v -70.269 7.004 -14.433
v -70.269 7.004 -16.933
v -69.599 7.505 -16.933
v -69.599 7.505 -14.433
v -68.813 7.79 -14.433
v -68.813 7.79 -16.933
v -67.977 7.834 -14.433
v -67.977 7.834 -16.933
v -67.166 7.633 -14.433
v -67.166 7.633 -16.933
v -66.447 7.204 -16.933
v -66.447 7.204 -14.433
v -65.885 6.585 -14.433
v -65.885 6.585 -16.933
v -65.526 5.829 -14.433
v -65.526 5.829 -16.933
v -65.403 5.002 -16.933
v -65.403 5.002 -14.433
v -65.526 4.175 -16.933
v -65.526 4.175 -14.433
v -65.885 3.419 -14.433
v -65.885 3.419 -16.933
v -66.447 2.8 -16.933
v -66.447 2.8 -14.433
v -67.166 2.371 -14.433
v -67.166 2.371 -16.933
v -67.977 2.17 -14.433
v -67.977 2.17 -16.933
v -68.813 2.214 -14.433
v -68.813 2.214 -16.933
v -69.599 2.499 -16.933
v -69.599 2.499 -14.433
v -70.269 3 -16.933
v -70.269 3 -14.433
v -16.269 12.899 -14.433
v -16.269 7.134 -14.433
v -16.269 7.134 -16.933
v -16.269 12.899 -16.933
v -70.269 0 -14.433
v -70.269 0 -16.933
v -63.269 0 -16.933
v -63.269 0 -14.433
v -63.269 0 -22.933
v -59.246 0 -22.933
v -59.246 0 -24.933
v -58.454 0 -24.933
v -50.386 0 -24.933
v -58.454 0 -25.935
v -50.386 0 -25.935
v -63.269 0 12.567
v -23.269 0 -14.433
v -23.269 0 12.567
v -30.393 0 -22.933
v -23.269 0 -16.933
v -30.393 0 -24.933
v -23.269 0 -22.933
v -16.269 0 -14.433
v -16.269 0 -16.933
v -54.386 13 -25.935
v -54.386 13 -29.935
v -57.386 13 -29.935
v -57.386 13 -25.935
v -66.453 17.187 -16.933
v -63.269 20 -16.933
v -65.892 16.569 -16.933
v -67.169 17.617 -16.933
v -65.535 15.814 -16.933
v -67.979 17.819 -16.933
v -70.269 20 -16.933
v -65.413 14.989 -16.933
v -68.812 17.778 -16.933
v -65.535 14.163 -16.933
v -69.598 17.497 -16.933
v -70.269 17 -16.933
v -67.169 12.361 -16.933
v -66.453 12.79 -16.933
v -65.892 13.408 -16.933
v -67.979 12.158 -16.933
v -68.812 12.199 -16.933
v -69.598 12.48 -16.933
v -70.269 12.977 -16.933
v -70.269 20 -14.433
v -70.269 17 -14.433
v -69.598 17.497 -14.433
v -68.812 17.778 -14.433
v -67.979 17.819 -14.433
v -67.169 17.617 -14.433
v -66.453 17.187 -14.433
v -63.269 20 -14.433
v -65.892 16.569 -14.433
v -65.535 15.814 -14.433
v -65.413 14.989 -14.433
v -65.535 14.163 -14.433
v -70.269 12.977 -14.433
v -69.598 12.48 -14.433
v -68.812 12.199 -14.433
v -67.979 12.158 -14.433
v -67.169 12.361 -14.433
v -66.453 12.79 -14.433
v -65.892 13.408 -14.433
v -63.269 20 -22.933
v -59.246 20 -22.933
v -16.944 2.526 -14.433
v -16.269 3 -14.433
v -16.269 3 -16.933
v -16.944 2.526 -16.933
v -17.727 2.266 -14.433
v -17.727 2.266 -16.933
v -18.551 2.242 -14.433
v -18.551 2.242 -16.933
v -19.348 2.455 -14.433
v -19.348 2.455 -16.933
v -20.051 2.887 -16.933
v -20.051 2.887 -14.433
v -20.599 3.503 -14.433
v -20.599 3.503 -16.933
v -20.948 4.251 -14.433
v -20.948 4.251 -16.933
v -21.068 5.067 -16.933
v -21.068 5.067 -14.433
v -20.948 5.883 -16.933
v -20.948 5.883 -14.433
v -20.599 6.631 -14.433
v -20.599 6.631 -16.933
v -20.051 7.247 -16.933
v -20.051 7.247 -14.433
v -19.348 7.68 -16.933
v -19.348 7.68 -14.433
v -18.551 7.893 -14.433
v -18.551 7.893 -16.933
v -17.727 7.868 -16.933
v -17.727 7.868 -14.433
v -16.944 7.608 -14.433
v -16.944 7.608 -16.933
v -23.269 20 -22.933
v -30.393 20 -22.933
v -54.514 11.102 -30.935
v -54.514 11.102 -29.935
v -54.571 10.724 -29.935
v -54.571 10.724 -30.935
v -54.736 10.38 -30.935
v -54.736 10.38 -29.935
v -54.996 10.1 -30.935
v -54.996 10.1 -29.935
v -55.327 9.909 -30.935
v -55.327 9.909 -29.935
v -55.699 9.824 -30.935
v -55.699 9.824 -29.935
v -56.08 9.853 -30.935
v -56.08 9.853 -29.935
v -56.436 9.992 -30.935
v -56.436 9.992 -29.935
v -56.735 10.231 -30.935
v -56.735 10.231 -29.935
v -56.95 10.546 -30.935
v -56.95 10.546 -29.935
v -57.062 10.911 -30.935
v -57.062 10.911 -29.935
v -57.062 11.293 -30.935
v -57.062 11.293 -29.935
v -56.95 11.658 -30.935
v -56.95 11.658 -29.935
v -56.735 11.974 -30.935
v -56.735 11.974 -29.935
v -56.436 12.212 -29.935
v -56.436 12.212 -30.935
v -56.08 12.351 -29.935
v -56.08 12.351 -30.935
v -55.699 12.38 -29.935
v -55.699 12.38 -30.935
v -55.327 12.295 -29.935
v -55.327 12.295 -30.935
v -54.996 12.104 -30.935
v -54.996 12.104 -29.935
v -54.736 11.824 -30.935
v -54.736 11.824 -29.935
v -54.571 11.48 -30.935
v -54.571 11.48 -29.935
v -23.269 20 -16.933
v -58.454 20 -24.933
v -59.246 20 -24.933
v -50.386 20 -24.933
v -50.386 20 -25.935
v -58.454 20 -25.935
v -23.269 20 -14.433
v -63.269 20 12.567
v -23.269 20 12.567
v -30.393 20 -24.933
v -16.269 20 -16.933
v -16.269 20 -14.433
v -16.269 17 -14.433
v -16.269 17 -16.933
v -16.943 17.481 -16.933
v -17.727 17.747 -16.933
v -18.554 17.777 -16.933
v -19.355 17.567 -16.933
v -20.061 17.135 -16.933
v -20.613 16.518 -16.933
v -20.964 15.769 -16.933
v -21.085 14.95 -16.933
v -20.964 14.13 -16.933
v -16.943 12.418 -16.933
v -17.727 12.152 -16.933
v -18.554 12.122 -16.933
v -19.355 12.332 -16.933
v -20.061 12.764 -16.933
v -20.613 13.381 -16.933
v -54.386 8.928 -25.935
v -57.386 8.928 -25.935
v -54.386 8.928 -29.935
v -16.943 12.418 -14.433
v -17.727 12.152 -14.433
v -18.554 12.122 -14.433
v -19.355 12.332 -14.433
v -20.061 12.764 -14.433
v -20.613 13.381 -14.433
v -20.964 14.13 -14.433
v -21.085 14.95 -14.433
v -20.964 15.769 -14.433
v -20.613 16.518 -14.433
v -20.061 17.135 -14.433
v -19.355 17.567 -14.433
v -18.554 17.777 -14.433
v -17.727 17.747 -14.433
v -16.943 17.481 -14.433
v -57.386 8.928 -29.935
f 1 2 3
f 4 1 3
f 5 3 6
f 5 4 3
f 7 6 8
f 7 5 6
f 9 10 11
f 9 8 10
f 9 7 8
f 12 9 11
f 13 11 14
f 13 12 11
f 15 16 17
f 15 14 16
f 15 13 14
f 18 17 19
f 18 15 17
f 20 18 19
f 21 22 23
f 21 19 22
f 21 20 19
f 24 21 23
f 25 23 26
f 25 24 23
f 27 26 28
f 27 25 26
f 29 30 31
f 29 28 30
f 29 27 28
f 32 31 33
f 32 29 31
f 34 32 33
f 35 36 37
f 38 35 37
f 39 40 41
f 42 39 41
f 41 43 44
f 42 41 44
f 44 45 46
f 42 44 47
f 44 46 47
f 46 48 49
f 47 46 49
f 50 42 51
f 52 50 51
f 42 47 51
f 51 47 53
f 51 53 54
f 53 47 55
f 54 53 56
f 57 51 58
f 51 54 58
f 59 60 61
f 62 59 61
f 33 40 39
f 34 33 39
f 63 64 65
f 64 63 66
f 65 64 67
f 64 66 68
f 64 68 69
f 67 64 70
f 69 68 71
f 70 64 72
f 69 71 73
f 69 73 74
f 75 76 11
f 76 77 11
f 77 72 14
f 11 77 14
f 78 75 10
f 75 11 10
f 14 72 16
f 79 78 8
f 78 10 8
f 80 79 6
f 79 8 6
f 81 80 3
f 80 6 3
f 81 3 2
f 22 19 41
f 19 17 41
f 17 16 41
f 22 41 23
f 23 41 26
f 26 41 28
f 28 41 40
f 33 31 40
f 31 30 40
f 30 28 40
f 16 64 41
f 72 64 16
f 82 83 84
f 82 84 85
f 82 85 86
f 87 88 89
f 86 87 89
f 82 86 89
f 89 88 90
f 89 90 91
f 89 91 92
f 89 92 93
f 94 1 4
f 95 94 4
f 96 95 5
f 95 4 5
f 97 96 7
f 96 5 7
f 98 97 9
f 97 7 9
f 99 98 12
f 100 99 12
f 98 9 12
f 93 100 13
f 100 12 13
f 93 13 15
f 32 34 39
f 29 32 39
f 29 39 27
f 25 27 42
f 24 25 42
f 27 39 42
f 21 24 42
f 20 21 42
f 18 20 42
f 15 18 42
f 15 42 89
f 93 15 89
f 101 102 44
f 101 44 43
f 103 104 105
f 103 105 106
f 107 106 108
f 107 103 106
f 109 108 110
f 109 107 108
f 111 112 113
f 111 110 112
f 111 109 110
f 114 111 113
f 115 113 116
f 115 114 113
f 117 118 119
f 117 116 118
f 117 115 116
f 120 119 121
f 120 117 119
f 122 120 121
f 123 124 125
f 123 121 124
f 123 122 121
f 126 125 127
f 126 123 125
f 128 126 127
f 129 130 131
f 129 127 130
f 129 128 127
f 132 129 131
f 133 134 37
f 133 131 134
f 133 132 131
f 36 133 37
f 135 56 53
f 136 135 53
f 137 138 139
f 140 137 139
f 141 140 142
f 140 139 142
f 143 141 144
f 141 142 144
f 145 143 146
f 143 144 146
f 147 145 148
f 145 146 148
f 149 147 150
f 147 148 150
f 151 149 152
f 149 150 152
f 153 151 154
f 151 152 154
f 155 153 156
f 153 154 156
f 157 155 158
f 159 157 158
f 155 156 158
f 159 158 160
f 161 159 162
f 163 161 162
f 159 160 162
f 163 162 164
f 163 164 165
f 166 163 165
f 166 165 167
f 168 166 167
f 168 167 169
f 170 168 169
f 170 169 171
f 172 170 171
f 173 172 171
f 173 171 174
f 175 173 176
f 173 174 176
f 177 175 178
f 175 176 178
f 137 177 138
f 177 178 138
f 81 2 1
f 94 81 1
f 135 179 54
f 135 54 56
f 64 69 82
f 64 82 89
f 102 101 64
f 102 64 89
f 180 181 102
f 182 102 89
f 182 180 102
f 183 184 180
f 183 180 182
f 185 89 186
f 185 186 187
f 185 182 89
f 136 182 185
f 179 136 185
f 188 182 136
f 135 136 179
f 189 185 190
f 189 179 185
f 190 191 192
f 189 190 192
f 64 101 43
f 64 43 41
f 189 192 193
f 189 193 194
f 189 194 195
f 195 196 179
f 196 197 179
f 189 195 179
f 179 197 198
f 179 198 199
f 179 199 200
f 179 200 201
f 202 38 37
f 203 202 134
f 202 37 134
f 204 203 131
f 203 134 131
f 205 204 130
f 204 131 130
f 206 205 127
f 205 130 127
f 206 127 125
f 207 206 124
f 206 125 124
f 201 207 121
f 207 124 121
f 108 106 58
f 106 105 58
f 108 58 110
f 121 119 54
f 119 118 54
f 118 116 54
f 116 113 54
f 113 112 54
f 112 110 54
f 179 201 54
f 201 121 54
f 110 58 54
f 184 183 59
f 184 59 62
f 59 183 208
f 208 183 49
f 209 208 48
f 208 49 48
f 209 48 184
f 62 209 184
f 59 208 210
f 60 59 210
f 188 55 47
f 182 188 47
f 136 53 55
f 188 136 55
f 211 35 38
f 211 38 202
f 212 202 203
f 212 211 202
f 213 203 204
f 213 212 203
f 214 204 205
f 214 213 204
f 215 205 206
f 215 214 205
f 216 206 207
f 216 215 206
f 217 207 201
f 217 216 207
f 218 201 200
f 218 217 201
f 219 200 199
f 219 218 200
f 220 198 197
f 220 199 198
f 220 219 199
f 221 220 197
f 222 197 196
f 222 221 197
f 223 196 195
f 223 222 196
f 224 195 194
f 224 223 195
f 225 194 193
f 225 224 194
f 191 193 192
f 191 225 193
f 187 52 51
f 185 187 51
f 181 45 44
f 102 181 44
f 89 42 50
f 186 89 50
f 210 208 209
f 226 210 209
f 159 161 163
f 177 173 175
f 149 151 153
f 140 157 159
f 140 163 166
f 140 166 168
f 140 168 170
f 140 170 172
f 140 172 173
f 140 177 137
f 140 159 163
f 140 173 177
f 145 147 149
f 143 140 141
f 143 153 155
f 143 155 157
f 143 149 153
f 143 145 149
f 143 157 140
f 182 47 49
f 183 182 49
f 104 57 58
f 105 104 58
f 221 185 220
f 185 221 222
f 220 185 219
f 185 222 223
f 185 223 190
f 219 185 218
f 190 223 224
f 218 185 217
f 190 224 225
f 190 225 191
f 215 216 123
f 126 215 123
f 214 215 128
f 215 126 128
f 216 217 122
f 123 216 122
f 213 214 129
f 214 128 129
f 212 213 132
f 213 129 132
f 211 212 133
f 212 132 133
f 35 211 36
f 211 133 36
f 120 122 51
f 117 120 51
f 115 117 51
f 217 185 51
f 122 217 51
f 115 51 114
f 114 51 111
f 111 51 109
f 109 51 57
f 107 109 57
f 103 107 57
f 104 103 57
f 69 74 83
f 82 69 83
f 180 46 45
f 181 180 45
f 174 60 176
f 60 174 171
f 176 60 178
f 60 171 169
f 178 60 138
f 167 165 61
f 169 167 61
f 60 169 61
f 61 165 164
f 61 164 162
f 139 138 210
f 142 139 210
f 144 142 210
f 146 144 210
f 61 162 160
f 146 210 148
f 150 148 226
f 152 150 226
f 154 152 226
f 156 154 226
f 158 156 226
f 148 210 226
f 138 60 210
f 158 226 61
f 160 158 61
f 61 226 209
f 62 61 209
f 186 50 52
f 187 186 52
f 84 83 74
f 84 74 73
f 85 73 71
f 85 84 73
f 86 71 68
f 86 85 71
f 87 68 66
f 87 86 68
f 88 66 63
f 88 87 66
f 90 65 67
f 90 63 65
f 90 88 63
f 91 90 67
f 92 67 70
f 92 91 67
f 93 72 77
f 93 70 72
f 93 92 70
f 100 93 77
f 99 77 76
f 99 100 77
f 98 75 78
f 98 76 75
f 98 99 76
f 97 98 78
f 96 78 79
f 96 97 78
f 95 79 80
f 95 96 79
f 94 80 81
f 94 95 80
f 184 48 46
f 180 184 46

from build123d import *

# Parameters (mm, degrees)
BOSS_EXTRUDE1_DEPTH     = 20
SKETCH2_W               = 3.154933035
SKETCH2_H               = 9.663476497
CUT_EXTRUDE1_DEPTH      = 4
SKETCH3_W               = 3
SKETCH3_H               = 7
CUT_EXTRUDE2_DEPTH      = 4
SKETCH4_R               = 1.281422033
BOSS_EXTRUDE3_DEPTH     = 1
CUT_EXTRUDE3_DEPTH      = 79.790553635
CUT_EXTRUDE3_DEPTH_BACK = 79.790553635
CUT_EXTRUDE4_DEPTH      = 79.790553635
CUT_EXTRUDE4_DEPTH_BACK = 79.790553635


with BuildPart() as part:
    # Sketch1 → Boss-Extrude1 (new body)
    with BuildSketch(Plane(origin=(0, 0, 0), x_dir=(1, 0, 0), z_dir=(0, 1, 0))):
        Polygon((-59.245647318, 22.93293572), (-63.268779285, 22.93293572), (-63.268779285, 16.93293572), (-70.268779285, 16.93293572), (-70.268779285, 14.43293572), (-63.268779285, 14.43293572), (-63.268779285, -12.56706428), (-23.268779285, -12.56706428), (-23.268779285, 14.43293572), (-16.268779285, 14.43293572), (-16.268779285, 16.93293572), (-23.268779285, 16.93293572), (-23.268779285, 22.93293572), (-30.393090753, 22.93293572), (-30.393090753, 24.93293572), (-50.386032487, 24.93293572), (-50.386032487, 25.935013561), (-54.386032487, 25.935013561), (-54.386032487, 29.935013561), (-57.386032487, 29.935013561), (-57.386032487, 25.935013561), (-58.4541935, 25.935013561), (-58.4541935, 24.93293572), (-59.245647318, 24.93293572), align=None)
    extrude(amount=BOSS_EXTRUDE1_DEPTH)

    # Sketch2 → Cut-Extrude1 (cut)
    with BuildSketch(Plane(origin=(0, 0, -25.935013561), x_dir=(-1, 0, 0), z_dir=(0, 0, -1))):
        with Locations((55.851514708, 4.096059823)):
            Rectangle(SKETCH2_W, SKETCH2_H)
    extrude(amount=CUT_EXTRUDE1_DEPTH, mode=Mode.SUBTRACT)

    # Sketch3 → Cut-Extrude2 (cut)
    with BuildSketch(Plane(origin=(0, 0, -29.935013561), x_dir=(-1, 0, 0), z_dir=(0, 0, -1))):
        with Locations((55.886032487, 16.5)):
            Rectangle(SKETCH3_W, SKETCH3_H)
    extrude(amount=-CUT_EXTRUDE2_DEPTH, mode=Mode.SUBTRACT)

    # Sketch4 → Boss-Extrude3 (add)
    with BuildSketch(Plane(origin=(0, 0, -29.935013561), x_dir=(-1, 0, 0), z_dir=(0, 0, -1))):
        with Locations(Location((55.79519526, 11.102128328, 0), (0, 0, 180))):
            Circle(SKETCH4_R)
    extrude(amount=BOSS_EXTRUDE3_DEPTH)

    # Sketch5 → Cut-Extrude3 (cut, two sides: drawn at the far end of the back side and taken through both)
    with BuildSketch(Plane(origin=(0, 0, -16.93293572), x_dir=(-1, 0, 0), z_dir=(0, 0, -1)).offset(-CUT_EXTRUDE3_DEPTH_BACK)):
        with BuildLine():
            Line((70.268779285, 12.977163389), (70.268779285, 17))
            ThreePointArc((70.268779285, 17), (65.412785932, 14.988581694), (70.268779285, 12.977163389))
        make_face()
        with BuildLine():
            Line((70.268779285, 3), (70.268779285, 7.004039222))
            ThreePointArc((70.268779285, 7.004039222), (65.403430944, 5.002019611), (70.268779285, 3))
        make_face()
    extrude(amount=CUT_EXTRUDE3_DEPTH + CUT_EXTRUDE3_DEPTH_BACK, mode=Mode.SUBTRACT)

    # Sketch6 → Cut-Extrude4 (cut, two sides: drawn at the far end of the back side and taken through both)
    with BuildSketch(Plane(origin=(0, 0, -16.93293572), x_dir=(-1, 0, 0), z_dir=(0, 0, -1)).offset(-CUT_EXTRUDE4_DEPTH_BACK)):
        with BuildLine():
            Line((16.268779285, 17), (16.268779285, 12.89909256))
            ThreePointArc((16.268779285, 12.89909256), (21.084964529, 14.94954628), (16.268779285, 17))
        make_face()
        with BuildLine():
            Line((16.268779285, 7.134169091), (16.268779285, 3))
            ThreePointArc((16.268779285, 3), (21.067521343, 5.067084545), (16.268779285, 7.134169091))
        make_face()
    extrude(amount=CUT_EXTRUDE4_DEPTH + CUT_EXTRUDE4_DEPTH_BACK, mode=Mode.SUBTRACT)


solid = part.part
